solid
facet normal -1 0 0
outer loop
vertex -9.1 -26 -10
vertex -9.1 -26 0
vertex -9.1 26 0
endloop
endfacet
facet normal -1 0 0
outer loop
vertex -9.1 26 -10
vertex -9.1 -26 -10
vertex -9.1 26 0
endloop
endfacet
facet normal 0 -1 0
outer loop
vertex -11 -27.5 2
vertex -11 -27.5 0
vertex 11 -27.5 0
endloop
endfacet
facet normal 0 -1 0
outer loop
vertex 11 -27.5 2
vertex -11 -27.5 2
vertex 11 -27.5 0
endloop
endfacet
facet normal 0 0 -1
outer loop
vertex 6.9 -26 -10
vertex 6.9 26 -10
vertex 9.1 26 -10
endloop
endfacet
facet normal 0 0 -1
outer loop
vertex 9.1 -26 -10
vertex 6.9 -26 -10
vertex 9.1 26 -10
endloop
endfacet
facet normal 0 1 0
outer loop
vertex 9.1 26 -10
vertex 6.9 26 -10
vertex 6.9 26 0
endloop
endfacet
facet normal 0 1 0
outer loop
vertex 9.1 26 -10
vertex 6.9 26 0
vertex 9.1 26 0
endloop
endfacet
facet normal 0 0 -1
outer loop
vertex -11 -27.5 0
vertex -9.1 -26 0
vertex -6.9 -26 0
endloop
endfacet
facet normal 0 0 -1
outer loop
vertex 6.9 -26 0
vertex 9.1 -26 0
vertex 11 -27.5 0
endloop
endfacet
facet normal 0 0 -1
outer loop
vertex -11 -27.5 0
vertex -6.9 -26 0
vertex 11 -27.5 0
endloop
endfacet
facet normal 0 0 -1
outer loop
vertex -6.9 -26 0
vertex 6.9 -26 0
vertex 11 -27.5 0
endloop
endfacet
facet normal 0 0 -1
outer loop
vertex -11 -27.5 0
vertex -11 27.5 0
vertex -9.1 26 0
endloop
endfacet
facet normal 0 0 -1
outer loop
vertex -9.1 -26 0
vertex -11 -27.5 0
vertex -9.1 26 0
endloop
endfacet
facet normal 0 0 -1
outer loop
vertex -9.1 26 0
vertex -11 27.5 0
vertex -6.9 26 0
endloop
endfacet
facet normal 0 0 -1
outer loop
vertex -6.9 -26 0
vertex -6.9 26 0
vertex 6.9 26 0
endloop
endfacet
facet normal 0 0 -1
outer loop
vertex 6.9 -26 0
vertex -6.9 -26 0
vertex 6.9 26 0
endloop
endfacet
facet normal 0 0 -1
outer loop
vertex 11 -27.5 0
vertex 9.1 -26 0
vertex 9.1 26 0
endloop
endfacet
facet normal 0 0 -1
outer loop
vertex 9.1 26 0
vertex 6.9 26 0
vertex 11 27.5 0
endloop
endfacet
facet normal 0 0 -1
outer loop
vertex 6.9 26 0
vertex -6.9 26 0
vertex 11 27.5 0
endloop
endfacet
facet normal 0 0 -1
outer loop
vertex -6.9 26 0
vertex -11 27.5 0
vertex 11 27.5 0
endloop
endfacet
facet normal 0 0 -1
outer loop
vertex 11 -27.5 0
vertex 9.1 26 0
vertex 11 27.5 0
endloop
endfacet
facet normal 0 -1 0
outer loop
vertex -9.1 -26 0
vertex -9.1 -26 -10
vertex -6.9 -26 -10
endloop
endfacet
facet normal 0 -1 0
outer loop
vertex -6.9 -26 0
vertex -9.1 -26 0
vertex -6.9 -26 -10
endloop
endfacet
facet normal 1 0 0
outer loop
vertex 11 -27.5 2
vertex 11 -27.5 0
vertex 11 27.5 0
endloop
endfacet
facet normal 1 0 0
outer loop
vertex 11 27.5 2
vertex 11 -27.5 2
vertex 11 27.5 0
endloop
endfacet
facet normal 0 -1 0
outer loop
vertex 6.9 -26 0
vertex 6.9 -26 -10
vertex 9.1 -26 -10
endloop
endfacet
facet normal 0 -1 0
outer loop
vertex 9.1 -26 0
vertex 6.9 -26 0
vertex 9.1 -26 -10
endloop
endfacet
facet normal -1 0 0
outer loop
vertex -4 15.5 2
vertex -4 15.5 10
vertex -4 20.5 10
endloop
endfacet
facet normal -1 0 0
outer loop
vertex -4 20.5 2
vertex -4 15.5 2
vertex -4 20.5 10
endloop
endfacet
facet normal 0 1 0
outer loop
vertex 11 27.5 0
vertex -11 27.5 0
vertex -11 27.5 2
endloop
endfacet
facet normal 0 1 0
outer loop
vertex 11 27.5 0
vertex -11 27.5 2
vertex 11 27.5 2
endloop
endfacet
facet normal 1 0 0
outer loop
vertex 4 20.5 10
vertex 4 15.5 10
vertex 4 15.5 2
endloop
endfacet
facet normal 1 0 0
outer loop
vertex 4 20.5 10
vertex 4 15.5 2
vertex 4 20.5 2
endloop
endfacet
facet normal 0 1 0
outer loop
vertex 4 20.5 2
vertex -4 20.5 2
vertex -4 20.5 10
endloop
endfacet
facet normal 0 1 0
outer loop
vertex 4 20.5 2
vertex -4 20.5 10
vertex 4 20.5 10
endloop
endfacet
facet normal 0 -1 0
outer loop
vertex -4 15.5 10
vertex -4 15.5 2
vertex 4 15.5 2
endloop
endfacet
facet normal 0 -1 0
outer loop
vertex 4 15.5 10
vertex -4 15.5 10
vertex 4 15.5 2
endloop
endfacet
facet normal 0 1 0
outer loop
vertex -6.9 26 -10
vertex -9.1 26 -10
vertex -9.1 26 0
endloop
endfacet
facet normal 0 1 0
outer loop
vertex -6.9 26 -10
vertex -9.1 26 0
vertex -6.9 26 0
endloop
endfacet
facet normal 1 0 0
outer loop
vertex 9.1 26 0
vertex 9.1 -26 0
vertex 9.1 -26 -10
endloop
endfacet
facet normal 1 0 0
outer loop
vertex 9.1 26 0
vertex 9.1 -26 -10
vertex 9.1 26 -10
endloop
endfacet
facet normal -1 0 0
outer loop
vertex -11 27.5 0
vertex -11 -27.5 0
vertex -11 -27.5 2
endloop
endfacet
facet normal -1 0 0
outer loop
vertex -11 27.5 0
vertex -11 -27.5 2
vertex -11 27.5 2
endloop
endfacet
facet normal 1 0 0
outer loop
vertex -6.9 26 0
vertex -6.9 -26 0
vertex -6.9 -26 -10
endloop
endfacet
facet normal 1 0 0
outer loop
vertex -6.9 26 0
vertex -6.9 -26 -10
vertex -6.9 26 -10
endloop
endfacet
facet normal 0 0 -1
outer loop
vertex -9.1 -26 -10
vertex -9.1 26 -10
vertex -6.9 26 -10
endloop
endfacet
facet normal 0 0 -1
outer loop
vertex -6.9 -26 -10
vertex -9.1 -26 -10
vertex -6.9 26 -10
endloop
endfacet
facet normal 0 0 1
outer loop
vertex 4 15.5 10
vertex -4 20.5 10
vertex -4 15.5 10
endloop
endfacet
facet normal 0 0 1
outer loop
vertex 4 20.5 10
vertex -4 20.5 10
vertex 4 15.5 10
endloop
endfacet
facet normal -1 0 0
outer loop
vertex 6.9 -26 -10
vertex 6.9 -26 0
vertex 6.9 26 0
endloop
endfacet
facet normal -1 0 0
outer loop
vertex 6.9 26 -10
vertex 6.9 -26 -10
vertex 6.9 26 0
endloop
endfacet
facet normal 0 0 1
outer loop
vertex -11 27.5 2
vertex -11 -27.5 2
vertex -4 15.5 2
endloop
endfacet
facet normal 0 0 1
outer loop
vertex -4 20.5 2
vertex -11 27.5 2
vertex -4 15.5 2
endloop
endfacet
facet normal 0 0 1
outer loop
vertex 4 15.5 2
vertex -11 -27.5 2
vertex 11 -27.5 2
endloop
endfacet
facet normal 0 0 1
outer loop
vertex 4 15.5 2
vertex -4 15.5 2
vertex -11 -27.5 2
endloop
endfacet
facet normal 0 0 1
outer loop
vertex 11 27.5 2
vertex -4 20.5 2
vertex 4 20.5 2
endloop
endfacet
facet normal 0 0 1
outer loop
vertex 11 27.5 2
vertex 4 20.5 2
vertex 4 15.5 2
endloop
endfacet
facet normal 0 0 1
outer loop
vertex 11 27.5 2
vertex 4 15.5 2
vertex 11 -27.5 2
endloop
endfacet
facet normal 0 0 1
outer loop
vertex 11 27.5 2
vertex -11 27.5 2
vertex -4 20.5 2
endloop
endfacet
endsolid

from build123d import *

# Parameters (mm, degrees)
SKETCH_1_W      = 22
SKETCH_1_H      = 55
EXTRUDE_1_DEPTH = 2
SKETCH_2_W      = 2.2
SKETCH_2_H      = 52
EXTRUDE_2_DEPTH = 10
SKETCH_4_W      = 8
SKETCH_4_H      = 5
EXTRUDE_3_DEPTH = 8


with BuildPart() as part:
    # 草图1 → 凸台-拉伸1 (new body)
    with BuildSketch(Plane.XY):
        Rectangle(SKETCH_1_W, SKETCH_1_H)
    extrude(amount=EXTRUDE_1_DEPTH)

    # 草图2 → 凸台-拉伸2 (add)
    with BuildSketch(Plane.XY):
        with Locations((8, 0)):
            Rectangle(SKETCH_2_W, SKETCH_2_H)
        with Locations((-8, 0)):
            Rectangle(SKETCH_2_W, SKETCH_2_H)
    extrude(amount=-EXTRUDE_2_DEPTH)

    # 草图4 → 凸台-拉伸3 (add)
    with BuildSketch(Plane.XY.offset(2)):
        with Locations((0, 18)):
            Rectangle(SKETCH_4_W, SKETCH_4_H)
    extrude(amount=EXTRUDE_3_DEPTH)


solid = part.part
